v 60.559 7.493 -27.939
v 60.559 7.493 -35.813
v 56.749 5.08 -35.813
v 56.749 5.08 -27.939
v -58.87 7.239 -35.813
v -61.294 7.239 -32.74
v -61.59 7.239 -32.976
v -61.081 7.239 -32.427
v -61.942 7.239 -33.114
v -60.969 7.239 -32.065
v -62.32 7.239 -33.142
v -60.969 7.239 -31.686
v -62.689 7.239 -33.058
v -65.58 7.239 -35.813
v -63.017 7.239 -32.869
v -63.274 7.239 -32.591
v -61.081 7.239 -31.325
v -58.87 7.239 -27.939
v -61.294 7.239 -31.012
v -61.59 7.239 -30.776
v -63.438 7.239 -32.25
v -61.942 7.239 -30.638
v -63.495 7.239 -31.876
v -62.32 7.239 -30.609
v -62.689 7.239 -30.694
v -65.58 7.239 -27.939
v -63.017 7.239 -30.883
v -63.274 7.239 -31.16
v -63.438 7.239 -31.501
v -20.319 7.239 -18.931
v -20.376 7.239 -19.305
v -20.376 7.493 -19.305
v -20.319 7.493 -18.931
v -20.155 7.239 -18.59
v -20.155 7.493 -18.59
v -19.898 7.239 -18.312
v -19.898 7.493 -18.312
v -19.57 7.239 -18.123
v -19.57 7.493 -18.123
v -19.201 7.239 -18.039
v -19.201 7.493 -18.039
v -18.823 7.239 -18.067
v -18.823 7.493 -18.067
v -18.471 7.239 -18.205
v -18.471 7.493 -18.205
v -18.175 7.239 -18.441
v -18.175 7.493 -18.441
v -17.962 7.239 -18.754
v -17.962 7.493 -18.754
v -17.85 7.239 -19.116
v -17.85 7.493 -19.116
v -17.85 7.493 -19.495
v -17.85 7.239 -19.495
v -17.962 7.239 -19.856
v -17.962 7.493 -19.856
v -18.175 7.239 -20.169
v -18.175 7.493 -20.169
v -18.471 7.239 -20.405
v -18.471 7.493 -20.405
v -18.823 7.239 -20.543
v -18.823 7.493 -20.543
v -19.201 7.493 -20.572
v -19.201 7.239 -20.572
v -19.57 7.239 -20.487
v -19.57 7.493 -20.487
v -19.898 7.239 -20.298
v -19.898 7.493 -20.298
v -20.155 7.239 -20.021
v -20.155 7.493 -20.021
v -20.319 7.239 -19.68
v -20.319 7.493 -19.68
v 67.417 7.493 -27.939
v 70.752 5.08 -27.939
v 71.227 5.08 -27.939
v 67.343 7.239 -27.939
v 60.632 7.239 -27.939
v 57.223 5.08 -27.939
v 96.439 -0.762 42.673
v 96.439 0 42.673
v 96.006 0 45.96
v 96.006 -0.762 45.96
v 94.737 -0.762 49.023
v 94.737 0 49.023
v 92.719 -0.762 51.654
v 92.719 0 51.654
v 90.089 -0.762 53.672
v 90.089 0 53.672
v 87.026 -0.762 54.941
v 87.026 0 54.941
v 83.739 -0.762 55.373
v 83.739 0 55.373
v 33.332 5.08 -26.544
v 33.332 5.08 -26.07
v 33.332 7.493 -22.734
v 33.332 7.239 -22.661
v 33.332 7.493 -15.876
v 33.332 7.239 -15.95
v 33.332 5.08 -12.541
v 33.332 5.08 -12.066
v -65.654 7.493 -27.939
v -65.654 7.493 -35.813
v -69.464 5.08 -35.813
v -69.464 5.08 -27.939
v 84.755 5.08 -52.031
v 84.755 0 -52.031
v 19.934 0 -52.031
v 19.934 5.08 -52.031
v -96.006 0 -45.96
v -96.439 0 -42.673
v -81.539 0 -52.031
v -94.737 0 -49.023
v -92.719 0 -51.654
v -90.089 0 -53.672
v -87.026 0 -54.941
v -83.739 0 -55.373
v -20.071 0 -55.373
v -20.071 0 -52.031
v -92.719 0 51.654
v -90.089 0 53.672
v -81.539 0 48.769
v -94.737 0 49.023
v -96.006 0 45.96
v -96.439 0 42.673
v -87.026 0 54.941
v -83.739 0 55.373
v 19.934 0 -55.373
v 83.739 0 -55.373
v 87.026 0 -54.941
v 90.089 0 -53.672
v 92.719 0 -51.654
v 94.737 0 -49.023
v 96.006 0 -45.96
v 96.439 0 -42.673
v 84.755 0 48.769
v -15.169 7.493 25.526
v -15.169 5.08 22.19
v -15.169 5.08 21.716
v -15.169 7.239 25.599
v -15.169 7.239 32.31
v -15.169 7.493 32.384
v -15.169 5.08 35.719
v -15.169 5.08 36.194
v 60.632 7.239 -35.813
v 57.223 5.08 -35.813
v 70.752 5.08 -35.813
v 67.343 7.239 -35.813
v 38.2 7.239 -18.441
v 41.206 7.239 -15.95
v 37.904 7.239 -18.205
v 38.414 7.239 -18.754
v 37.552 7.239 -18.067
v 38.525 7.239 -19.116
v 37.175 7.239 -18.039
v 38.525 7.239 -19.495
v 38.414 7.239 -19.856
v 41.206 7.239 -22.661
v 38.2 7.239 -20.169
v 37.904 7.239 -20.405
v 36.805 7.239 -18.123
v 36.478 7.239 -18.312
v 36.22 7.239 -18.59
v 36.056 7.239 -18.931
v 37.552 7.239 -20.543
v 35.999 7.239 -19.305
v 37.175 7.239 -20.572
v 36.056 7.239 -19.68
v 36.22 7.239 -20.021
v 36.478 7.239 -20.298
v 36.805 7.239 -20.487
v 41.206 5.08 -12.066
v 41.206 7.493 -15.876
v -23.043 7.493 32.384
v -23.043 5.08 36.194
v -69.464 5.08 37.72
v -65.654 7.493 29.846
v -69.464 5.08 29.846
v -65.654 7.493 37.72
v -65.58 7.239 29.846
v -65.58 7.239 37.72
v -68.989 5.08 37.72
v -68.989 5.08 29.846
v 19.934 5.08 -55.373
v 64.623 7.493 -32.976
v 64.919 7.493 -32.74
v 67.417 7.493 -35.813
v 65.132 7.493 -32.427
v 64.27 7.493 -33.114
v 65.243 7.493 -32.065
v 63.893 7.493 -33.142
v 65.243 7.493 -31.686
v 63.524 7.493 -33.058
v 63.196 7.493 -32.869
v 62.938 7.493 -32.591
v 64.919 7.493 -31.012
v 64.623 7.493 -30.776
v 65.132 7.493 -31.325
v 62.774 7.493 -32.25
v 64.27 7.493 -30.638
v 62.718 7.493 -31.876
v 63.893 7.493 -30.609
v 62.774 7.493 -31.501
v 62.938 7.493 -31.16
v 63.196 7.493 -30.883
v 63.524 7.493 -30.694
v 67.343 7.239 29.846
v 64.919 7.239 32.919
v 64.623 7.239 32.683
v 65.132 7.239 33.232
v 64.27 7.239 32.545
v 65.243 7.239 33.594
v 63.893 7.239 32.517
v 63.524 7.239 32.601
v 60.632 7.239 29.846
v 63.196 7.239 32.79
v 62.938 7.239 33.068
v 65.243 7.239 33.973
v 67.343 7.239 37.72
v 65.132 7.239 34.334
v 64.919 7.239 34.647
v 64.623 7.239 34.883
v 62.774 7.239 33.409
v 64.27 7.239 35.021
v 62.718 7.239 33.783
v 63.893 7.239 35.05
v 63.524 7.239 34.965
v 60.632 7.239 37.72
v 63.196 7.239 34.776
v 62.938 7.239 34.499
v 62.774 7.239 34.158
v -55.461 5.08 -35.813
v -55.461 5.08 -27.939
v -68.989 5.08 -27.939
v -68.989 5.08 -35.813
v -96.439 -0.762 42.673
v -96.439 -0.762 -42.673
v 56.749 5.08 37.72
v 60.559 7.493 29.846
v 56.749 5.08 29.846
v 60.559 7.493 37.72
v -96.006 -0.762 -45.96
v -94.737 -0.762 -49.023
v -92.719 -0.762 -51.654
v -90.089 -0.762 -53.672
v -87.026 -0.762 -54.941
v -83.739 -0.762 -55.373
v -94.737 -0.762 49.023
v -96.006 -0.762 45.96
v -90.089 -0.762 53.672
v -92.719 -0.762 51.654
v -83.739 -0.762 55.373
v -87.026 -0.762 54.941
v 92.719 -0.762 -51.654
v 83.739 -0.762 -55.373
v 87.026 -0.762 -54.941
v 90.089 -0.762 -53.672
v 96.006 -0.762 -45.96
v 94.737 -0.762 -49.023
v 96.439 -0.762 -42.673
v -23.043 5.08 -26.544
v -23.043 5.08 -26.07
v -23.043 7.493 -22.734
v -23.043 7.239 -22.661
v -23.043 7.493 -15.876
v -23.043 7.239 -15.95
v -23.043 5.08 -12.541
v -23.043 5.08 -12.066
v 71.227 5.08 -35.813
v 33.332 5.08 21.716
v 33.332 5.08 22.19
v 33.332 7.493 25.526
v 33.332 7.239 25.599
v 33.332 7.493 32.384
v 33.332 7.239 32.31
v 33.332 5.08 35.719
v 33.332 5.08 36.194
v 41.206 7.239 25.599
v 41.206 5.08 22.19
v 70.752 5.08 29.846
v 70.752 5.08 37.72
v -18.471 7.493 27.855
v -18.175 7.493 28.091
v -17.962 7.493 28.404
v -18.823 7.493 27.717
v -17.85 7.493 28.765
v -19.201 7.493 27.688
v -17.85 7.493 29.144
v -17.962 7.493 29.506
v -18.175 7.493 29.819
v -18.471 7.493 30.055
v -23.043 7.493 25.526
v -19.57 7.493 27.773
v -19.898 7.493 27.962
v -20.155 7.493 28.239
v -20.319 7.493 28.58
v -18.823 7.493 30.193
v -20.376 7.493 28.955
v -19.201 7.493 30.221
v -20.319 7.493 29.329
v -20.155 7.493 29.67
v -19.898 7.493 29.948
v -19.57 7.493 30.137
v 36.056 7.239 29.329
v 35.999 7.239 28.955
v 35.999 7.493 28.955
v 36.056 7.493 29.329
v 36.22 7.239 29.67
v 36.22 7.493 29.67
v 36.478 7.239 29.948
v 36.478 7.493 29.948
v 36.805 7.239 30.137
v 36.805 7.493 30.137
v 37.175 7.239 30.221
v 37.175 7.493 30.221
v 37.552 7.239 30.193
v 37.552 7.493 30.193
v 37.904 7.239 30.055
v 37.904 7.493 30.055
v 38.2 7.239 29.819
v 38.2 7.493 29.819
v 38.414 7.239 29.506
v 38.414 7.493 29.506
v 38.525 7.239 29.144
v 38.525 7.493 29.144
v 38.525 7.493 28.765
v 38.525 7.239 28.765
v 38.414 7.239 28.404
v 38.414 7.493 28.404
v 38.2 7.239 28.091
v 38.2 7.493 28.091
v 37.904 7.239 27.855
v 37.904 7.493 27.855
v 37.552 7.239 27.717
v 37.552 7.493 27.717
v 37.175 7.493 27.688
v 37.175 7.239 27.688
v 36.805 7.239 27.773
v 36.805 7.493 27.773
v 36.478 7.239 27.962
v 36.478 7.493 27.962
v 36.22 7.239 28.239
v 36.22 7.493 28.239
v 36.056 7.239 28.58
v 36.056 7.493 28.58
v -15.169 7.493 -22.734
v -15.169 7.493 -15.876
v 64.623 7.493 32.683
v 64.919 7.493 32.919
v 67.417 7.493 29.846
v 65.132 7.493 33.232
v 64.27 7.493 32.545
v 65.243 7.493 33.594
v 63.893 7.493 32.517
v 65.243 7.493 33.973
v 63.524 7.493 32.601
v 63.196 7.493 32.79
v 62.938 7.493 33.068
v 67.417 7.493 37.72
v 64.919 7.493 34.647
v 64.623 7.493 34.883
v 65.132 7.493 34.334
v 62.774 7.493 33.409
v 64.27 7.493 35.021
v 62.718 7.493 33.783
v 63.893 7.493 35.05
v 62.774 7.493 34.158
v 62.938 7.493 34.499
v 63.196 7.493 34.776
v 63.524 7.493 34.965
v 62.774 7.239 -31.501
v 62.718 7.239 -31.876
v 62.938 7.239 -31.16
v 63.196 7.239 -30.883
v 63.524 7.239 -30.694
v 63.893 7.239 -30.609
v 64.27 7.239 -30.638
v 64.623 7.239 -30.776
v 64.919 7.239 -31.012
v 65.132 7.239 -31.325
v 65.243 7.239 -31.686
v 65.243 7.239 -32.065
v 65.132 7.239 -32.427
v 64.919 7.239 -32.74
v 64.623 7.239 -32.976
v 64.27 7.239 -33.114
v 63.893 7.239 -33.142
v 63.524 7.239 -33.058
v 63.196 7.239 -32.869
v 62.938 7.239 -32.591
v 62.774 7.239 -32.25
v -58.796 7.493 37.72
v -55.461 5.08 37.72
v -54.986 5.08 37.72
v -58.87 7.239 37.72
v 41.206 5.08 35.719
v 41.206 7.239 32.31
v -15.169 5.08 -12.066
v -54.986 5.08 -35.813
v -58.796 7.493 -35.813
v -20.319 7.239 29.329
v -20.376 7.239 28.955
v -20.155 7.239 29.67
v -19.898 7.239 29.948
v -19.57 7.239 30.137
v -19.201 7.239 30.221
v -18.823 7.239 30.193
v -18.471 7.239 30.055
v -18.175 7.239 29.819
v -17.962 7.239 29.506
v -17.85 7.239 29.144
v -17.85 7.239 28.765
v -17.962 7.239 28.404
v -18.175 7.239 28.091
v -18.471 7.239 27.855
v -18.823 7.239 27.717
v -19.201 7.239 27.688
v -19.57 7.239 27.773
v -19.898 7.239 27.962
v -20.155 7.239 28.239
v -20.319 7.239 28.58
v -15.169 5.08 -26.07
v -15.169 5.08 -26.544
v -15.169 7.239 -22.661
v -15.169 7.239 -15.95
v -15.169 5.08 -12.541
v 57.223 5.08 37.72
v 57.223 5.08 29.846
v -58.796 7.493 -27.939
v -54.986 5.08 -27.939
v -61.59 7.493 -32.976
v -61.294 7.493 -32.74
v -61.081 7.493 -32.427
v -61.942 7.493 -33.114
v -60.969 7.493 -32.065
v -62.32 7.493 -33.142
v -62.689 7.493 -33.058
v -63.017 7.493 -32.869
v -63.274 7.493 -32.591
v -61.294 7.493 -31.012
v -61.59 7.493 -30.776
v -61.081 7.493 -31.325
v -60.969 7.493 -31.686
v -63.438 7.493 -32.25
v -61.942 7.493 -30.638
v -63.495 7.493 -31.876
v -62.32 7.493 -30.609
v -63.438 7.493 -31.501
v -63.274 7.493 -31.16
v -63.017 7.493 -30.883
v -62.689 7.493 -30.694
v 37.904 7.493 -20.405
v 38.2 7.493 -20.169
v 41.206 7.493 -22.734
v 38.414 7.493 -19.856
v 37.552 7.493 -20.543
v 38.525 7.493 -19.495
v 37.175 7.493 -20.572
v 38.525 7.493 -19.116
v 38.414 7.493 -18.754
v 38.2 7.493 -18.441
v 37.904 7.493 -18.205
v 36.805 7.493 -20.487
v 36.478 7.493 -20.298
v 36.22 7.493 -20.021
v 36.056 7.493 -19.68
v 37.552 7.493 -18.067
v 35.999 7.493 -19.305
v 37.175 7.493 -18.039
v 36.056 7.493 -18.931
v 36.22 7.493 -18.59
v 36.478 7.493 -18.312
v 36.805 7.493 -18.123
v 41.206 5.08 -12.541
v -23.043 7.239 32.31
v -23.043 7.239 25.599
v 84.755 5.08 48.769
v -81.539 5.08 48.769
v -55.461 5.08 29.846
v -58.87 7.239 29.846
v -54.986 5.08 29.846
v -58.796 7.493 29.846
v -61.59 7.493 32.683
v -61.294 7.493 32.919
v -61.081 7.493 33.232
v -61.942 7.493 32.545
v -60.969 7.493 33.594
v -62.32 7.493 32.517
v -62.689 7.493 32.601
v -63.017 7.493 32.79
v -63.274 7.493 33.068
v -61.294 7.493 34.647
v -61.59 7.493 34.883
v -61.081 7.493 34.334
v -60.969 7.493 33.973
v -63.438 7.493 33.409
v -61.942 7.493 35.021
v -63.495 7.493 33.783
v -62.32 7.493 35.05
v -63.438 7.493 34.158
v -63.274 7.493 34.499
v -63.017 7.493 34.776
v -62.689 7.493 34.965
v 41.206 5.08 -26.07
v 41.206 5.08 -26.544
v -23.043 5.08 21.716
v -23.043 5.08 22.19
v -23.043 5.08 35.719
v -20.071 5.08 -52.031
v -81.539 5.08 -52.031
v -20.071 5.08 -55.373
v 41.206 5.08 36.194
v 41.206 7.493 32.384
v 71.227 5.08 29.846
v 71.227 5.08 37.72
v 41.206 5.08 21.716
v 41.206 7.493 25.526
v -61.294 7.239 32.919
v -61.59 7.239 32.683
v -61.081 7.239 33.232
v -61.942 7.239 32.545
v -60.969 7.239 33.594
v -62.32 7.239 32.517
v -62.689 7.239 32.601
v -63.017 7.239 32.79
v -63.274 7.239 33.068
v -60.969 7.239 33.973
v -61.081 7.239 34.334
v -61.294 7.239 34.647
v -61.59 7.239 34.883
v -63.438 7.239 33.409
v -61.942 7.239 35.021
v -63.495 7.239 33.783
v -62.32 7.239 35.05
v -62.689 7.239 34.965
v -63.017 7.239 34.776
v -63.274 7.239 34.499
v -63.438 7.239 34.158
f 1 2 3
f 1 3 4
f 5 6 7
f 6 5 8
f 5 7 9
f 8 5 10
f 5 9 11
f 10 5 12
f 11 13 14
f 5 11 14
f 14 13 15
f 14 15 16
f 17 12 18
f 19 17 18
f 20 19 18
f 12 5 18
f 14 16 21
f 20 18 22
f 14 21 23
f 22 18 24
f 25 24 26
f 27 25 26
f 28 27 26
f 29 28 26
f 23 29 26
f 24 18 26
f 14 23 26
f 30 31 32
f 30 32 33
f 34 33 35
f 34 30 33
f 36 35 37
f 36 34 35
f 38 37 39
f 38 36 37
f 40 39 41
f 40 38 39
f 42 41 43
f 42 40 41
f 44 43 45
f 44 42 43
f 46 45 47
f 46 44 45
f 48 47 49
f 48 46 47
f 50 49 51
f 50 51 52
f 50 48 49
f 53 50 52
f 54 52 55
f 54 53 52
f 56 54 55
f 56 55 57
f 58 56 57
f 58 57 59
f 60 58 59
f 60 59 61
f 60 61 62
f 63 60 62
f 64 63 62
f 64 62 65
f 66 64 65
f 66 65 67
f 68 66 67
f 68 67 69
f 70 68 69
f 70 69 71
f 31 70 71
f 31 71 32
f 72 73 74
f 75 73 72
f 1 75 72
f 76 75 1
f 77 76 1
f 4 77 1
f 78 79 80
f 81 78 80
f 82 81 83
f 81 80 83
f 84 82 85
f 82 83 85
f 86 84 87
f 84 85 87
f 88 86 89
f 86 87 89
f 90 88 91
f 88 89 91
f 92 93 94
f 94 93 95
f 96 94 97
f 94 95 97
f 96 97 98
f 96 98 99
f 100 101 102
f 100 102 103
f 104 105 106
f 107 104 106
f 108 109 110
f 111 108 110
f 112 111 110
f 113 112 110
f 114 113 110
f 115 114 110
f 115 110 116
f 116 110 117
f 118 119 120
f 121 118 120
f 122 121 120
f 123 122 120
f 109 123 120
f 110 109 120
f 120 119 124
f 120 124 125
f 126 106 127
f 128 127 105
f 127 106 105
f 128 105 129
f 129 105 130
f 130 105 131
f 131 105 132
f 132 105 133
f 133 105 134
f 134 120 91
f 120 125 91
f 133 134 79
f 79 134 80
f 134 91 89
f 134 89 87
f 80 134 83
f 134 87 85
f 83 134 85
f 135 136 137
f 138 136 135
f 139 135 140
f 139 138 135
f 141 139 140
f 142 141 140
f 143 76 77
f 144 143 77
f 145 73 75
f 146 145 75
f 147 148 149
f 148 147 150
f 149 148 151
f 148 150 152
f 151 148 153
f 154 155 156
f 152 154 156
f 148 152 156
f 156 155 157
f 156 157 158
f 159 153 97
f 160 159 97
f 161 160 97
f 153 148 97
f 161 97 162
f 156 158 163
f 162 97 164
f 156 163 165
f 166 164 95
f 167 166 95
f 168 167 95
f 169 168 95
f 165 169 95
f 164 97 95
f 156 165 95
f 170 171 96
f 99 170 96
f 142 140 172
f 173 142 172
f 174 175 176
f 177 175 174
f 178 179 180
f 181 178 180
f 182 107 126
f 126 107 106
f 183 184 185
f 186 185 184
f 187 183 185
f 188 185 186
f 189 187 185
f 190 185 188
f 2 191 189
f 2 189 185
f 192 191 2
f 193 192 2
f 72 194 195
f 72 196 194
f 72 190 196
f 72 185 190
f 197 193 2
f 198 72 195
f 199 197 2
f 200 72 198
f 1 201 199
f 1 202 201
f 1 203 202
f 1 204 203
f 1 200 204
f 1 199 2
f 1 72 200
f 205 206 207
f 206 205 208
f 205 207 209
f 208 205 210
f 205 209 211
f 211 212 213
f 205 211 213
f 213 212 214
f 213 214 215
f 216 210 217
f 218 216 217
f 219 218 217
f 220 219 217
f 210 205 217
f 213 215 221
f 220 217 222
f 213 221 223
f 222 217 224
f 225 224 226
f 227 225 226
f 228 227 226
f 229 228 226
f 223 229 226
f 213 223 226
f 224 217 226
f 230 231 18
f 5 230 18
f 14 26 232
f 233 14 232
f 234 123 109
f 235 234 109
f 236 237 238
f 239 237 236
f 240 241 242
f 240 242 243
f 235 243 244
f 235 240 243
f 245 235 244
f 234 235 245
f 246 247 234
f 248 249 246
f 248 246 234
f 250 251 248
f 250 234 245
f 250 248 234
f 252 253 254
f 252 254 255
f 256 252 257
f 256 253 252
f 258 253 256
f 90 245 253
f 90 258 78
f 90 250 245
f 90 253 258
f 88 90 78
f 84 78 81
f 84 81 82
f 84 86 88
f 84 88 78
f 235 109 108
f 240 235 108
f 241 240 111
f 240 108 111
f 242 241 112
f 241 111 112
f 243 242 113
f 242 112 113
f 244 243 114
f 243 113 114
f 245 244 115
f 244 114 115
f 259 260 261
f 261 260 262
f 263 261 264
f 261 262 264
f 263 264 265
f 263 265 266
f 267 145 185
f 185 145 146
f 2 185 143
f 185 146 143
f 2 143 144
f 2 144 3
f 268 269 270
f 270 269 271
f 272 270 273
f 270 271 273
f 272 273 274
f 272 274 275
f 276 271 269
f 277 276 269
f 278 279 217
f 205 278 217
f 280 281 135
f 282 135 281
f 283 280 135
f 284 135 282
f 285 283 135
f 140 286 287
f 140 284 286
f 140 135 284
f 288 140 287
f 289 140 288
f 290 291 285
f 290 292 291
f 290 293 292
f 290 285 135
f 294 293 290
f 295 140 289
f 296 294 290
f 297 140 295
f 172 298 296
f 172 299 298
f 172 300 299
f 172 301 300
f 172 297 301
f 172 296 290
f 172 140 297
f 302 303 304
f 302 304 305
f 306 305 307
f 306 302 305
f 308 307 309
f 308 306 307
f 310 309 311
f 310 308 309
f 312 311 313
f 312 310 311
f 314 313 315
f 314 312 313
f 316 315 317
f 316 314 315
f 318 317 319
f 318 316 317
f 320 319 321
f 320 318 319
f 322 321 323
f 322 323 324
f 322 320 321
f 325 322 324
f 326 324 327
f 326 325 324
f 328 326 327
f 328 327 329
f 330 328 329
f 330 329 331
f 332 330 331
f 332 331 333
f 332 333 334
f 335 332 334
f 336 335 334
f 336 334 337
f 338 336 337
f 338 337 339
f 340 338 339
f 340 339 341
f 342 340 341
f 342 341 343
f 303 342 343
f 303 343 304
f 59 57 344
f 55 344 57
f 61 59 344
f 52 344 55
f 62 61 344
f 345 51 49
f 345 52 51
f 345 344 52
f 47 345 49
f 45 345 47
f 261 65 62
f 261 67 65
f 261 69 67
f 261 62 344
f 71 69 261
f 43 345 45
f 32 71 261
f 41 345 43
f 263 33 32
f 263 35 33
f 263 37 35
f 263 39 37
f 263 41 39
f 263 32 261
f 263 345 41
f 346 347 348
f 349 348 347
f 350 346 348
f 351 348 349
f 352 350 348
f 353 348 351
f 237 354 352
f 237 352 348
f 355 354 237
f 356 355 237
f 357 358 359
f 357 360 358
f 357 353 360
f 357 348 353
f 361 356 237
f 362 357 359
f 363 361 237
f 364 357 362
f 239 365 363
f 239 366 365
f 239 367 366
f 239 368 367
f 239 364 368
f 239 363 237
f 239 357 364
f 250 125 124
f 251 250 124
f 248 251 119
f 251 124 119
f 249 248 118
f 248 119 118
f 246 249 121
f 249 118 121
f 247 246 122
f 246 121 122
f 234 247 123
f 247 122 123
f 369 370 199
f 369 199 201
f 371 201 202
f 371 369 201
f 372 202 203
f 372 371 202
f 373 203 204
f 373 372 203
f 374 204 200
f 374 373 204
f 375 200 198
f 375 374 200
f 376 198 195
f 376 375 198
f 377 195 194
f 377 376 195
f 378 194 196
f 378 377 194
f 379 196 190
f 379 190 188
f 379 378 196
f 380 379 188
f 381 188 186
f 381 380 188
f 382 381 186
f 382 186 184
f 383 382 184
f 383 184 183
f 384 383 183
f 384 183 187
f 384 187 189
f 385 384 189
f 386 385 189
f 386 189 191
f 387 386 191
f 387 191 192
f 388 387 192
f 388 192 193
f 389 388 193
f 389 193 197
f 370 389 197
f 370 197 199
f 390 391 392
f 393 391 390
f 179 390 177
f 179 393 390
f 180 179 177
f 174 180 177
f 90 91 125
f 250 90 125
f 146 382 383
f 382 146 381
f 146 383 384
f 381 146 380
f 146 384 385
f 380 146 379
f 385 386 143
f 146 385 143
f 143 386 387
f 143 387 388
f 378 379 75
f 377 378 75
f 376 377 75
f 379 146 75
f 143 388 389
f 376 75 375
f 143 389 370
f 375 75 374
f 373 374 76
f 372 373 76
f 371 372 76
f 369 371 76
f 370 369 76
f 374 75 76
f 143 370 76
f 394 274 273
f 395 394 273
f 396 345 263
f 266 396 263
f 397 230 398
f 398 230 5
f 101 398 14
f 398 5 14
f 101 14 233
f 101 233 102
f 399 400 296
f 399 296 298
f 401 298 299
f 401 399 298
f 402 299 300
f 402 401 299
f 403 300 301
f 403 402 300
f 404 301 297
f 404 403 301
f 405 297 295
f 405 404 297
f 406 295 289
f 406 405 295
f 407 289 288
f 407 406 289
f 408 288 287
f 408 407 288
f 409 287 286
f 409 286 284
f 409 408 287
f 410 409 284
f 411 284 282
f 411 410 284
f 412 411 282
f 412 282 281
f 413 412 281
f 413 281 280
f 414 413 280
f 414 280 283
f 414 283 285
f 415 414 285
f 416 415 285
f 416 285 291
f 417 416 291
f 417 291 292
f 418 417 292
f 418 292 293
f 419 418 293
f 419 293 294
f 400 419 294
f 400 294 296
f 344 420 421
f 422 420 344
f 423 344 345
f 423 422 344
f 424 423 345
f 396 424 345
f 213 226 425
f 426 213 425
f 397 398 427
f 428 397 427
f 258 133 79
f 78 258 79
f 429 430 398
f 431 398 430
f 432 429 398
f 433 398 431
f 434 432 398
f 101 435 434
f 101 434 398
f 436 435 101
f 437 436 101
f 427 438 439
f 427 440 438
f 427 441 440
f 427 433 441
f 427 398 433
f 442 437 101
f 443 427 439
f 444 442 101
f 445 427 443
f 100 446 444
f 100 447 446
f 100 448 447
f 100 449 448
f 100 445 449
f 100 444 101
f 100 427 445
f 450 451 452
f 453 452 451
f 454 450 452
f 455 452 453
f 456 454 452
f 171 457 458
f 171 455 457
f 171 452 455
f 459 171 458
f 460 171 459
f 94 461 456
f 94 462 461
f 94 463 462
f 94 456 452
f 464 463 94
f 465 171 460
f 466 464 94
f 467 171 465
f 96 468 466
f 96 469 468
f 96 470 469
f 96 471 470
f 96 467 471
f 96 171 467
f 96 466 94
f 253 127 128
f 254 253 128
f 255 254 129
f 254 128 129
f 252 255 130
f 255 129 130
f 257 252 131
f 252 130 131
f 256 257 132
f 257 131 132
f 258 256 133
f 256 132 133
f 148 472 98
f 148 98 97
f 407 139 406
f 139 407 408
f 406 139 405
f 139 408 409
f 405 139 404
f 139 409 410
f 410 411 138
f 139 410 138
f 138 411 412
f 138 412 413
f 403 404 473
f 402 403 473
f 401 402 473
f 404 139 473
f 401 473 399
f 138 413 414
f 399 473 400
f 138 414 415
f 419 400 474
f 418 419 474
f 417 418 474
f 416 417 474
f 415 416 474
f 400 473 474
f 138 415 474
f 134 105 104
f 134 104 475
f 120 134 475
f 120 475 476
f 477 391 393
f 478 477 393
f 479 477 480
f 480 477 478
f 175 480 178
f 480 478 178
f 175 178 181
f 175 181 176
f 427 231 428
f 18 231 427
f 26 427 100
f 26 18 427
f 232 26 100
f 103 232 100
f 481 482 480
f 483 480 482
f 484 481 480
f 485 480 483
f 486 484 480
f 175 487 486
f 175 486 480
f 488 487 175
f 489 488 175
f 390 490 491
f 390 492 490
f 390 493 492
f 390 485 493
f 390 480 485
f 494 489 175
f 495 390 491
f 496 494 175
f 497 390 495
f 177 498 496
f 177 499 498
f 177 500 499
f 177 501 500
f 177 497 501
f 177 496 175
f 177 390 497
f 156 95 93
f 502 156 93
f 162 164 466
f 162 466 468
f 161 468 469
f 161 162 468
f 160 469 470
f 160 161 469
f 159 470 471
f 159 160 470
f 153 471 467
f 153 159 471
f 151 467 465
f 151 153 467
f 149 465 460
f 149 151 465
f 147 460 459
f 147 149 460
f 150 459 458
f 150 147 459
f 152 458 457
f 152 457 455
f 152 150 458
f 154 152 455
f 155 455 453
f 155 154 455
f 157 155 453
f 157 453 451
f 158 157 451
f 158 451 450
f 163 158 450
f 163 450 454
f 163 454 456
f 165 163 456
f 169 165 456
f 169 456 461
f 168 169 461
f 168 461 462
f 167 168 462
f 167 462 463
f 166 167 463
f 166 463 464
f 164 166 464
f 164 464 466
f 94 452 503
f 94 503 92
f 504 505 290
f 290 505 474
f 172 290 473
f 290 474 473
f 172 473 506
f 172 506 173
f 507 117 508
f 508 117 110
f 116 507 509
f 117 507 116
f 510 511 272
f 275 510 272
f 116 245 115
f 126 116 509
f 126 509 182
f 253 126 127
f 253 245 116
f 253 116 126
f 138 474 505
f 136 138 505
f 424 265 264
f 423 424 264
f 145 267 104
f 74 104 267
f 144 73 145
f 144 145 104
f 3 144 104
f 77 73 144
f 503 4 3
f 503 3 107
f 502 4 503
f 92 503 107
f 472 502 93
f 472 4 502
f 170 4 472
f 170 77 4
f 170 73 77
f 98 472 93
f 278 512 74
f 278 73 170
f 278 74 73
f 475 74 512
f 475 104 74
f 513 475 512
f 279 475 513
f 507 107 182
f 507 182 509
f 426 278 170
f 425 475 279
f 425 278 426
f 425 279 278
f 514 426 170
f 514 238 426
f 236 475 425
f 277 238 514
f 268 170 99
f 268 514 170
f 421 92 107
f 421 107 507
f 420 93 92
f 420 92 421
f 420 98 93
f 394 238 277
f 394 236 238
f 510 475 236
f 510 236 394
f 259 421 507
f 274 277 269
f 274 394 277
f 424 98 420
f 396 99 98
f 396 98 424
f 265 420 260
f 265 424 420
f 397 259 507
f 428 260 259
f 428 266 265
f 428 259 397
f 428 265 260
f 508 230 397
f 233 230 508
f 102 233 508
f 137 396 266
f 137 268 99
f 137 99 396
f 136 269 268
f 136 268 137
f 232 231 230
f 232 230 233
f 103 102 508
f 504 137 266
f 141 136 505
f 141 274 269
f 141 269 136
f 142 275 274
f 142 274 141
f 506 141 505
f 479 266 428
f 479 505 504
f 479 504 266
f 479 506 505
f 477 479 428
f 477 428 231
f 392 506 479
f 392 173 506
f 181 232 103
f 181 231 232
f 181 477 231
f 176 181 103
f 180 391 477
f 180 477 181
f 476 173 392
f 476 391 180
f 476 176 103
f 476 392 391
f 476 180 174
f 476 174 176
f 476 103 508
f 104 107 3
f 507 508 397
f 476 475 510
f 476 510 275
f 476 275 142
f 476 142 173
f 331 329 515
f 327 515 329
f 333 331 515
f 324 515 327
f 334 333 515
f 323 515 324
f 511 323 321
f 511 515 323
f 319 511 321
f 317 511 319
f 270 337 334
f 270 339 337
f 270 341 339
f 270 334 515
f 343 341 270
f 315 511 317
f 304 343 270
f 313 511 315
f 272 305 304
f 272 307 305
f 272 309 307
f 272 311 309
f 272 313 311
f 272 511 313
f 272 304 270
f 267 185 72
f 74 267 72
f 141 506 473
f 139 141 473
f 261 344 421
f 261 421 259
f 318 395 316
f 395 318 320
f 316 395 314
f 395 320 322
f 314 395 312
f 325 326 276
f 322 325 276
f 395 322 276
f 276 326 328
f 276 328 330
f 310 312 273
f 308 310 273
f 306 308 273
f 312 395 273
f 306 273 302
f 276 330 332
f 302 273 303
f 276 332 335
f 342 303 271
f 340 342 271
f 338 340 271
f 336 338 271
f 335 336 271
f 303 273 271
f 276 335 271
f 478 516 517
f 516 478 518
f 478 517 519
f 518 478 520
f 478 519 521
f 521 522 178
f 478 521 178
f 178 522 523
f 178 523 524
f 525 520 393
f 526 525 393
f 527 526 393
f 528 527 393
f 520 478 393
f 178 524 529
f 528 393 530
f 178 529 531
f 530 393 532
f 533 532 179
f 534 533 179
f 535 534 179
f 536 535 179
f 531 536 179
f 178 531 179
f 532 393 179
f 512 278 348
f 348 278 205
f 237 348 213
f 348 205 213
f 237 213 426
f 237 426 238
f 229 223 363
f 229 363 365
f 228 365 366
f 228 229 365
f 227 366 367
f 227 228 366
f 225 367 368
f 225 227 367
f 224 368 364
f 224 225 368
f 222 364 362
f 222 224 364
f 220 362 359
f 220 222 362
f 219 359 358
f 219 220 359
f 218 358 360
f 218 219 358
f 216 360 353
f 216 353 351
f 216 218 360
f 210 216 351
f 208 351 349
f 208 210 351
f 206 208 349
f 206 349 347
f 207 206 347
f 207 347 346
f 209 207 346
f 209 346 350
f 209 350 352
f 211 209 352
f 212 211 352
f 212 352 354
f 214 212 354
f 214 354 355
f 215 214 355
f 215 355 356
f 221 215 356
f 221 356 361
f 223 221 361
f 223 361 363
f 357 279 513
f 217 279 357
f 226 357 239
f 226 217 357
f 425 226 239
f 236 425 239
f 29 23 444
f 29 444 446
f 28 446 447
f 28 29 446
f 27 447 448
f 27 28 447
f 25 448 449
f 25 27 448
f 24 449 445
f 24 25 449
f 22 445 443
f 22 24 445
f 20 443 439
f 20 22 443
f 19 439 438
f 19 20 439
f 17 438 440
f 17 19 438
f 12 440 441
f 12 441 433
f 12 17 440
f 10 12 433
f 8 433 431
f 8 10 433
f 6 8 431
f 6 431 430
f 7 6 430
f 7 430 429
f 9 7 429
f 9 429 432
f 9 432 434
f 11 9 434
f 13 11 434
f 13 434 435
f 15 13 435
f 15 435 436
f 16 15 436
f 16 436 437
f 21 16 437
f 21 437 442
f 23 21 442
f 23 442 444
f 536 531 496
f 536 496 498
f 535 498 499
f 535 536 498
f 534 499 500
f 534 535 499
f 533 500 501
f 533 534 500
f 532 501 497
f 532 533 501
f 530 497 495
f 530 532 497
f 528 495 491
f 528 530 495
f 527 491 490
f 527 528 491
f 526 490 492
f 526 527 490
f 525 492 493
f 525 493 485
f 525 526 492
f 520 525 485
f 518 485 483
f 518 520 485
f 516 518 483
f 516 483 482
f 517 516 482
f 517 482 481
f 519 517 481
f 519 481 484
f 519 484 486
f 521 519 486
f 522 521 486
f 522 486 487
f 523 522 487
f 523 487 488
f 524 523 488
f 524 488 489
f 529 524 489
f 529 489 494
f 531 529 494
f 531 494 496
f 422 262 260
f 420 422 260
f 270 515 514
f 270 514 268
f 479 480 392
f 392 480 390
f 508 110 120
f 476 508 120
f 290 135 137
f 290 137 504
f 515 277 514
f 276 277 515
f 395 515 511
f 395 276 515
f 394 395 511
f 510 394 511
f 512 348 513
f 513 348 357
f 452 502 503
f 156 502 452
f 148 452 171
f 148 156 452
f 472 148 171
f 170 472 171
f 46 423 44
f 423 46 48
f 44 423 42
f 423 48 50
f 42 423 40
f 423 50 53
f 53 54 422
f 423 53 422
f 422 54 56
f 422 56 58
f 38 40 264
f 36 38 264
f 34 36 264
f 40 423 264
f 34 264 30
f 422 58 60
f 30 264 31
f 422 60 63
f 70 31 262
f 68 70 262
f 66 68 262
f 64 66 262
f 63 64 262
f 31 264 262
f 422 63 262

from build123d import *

# Parameters (mm, degrees)
F1_DEPTH   = 0.762
F2_W       = 166.2938
F2_H       = 100.7999
F3_DEPTH   = 5.08
F4_W       = 14.478
F4_H       = 7.874
F4_R       = 1.27
F4_W_2     = 7.874
F4_H_2     = 14.478
F5_DEPTH   = 2.413
F6_SIZE2   = 3.80999
F6_SIZE    = 2.41299
F6_2_SIZE2 = 3.80999
F6_2_SIZE  = 2.41299
F6_3_SIZE2 = 3.80999
F6_3_SIZE  = 2.41299
F6_4_SIZE2 = 3.80999
F6_4_SIZE  = 2.41299
F6_5_SIZE2 = 3.80999
F6_5_SIZE  = 2.41299
F6_6_SIZE2 = 3.80999
F6_6_SIZE  = 2.41299
F6_7_SIZE2 = 3.80999
F6_7_SIZE  = 2.41299
F6_8_SIZE2 = 3.80999
F6_8_SIZE  = 2.41299
F6_9_SIZE2 = 3.80999
F6_9_SIZE  = 2.41299
F7_SIZE2   = 3.80999
F7_SIZE    = 2.41299
F7_2_SIZE2 = 3.80999
F7_2_SIZE  = 2.41299
F7_3_SIZE2 = 3.80999
F7_3_SIZE  = 2.41299
F7_4_SIZE2 = 3.80999
F7_4_SIZE  = 2.41299
F7_5_SIZE2 = 3.80999
F7_5_SIZE  = 2.41299
F7_6_SIZE2 = 3.80999
F7_6_SIZE  = 2.41299
F7_7_SIZE2 = 3.80999
F7_7_SIZE  = 2.41299
F9_DEPTH   = 73.533
F11_DEPTH  = 64.2493
F12_W      = 40.005
F12_H      = 5.08
F13_DEPTH  = 3.34264


# Not quite as in the source:
# - a fillet or chamfer is up to 0.001 mm smaller than in the source, because OpenCascade refuses the exact size


with BuildPart() as f1:
    # F0 (on Front) → F1 (new body)
    with BuildSketch(Plane.XZ):
        with BuildLine():
            ThreePointArc((96.43872, 42.67327), (92.7189761211, 51.6535261211), (83.73872, 55.37327))
            Line((83.73872, 55.37327), (-83.73872, 55.37327))
            ThreePointArc((-83.73872, 55.37327), (-92.7189761211, 51.6535261211), (-96.43872, 42.67327))
            Line((-96.43872, 42.67327), (-96.43872, -42.67327))
            ThreePointArc((-96.43872, -42.67327), (-92.7189761211, -51.6535261211), (-83.73872, -55.37327))
            Line((-83.73872, -55.37327), (83.73872, -55.37327))
            ThreePointArc((83.73872, -55.37327), (92.7189761211, -51.6535261211), (96.43872, -42.67327))
            Line((96.43872, -42.67327), (96.43872, 42.67327))
        make_face()
    extrude(amount=F1_DEPTH)

    # F2 (on face) → F3 (join)
    with BuildSketch(Plane(origin=(0, 0, 0), x_dir=(-1, 0, 0), z_dir=(0, 1, 0))):
        with Locations((-1.60782, -1.63068)):
            Rectangle(F2_W, F2_H)
    extrude(amount=F3_DEPTH)

    # F4 (on face) → F5 (join)
    with BuildSketch(Plane(origin=(0, 5.08, 0), x_dir=(-1, 0, 0), z_dir=(0, 1, 0))):
        with Locations((-63.98768, 33.78327)):
            Rectangle(F4_W, F4_H)
        with Locations((-63.98768, 33.78327)):
            Circle(F4_R, mode=Mode.SUBTRACT)
        with Locations((-63.98768, -31.87573)):
            Rectangle(F4_W, F4_H)
        with Locations((-63.98768, -31.87573)):
            Circle(F4_R, mode=Mode.SUBTRACT)
        with Locations((62.22492, 33.78327)):
            Rectangle(F4_W, F4_H)
        with Locations((62.22492, 33.78327)):
            Circle(F4_R, mode=Mode.SUBTRACT)
        with Locations((62.22492, -31.87573)):
            Rectangle(F4_W, F4_H)
        with Locations((62.22492, -31.87573)):
            Circle(F4_R, mode=Mode.SUBTRACT)
        with Locations((-37.26942, 28.95473)):
            Rectangle(F4_W_2, F4_H_2)
        with Locations((-37.26942, 28.95473)):
            Circle(F4_R, mode=Mode.SUBTRACT)
        with Locations((19.10588, 28.95473)):
            Rectangle(F4_W_2, F4_H_2)
        with Locations((19.10588, 28.95473)):
            Circle(F4_R, mode=Mode.SUBTRACT)
        with Locations((-37.26942, -19.30527)):
            Rectangle(F4_W_2, F4_H_2)
        with Locations((-37.26942, -19.30527)):
            Circle(F4_R, mode=Mode.SUBTRACT)
        with Locations((19.10588, -19.30527)):
            Rectangle(F4_W_2, F4_H_2)
        with Locations((19.10588, -19.30527)):
            Circle(F4_R, mode=Mode.SUBTRACT)
    extrude(amount=F5_DEPTH)

    # F6 (size 2.413 and 3.81 in the source; OpenCascade refuses exactly that, so slightly less here)
    f6_edges = [f1.edges().sort_by_distance(p)[0] for p in [
        (56.74868, 7.493, 33.78327),
    ]]
    f6_side = f1.faces().sort_by_distance((56.74868, 6.2865, 33.78327))[0]
    chamfer(f6_edges, length=F6_SIZE, length2=F6_SIZE2, reference=f6_side)

    # F6#2 (size 2.413 and 3.81 in the source; OpenCascade refuses exactly that, so slightly less here)
    f6_2_edges = [f1.edges().sort_by_distance(p)[0] for p in [
        (71.22668, 7.493, 33.78327),
    ]]
    f6_2_side = f1.faces().sort_by_distance((71.22668, 6.2865, 33.78327))[0]
    chamfer(f6_2_edges, length=F6_2_SIZE, length2=F6_2_SIZE2, reference=f6_2_side)

    # F6#3 (size 2.413 and 3.81 in the source; OpenCascade refuses exactly that, so slightly less here)
    f6_3_edges = [f1.edges().sort_by_distance(p)[0] for p in [
        (56.74868, 7.493, -31.87573),
    ]]
    f6_3_side = f1.faces().sort_by_distance((56.74868, 6.2865, -31.87573))[0]
    chamfer(f6_3_edges, length=F6_3_SIZE, length2=F6_3_SIZE2, reference=f6_3_side)

    # F6#4 (size 2.413 and 3.81 in the source; OpenCascade refuses exactly that, so slightly less here)
    f6_4_edges = [f1.edges().sort_by_distance(p)[0] for p in [
        (37.26942, 7.493, -26.54427),
    ]]
    f6_4_side = f1.faces().sort_by_distance((37.26942, 6.2865, -26.54427))[0]
    chamfer(f6_4_edges, length=F6_4_SIZE, length2=F6_4_SIZE2, reference=f6_4_side)

    # F6#5 (size 2.413 and 3.81 in the source; OpenCascade refuses exactly that, so slightly less here)
    f6_5_edges = [f1.edges().sort_by_distance(p)[0] for p in [
        (37.26942, 7.493, 21.71573),
    ]]
    f6_5_side = f1.faces().sort_by_distance((37.26942, 6.2865, 21.71573))[0]
    chamfer(f6_5_edges, length=F6_5_SIZE, length2=F6_5_SIZE2, reference=f6_5_side)

    # F6#6 (size 2.413 and 3.81 in the source; OpenCascade refuses exactly that, so slightly less here)
    f6_6_edges = [f1.edges().sort_by_distance(p)[0] for p in [
        (-19.10588, 7.493, -26.54427),
    ]]
    f6_6_side = f1.faces().sort_by_distance((-19.10588, 6.2865, -26.54427))[0]
    chamfer(f6_6_edges, length=F6_6_SIZE, length2=F6_6_SIZE2, reference=f6_6_side)

    # F6#7 (size 2.413 and 3.81 in the source; OpenCascade refuses exactly that, so slightly less here)
    f6_7_edges = [f1.edges().sort_by_distance(p)[0] for p in [
        (-19.10588, 7.493, 21.71573),
    ]]
    f6_7_side = f1.faces().sort_by_distance((-19.10588, 6.2865, 21.71573))[0]
    chamfer(f6_7_edges, length=F6_7_SIZE, length2=F6_7_SIZE2, reference=f6_7_side)

    # F6#8 (size 2.413 and 3.81 in the source; OpenCascade refuses exactly that, so slightly less here)
    f6_8_edges = [f1.edges().sort_by_distance(p)[0] for p in [
        (-69.46392, 7.493, 33.78327),
    ]]
    f6_8_side = f1.faces().sort_by_distance((-69.46392, 6.2865, 33.78327))[0]
    chamfer(f6_8_edges, length=F6_8_SIZE, length2=F6_8_SIZE2, reference=f6_8_side)

    # F6#9 (size 2.413 and 3.81 in the source; OpenCascade refuses exactly that, so slightly less here)
    f6_9_edges = [f1.edges().sort_by_distance(p)[0] for p in [
        (-69.46392, 7.493, -31.87573),
    ]]
    f6_9_side = f1.faces().sort_by_distance((-69.46392, 6.2865, -31.87573))[0]
    chamfer(f6_9_edges, length=F6_9_SIZE, length2=F6_9_SIZE2, reference=f6_9_side)

    # F7 (size 2.413 and 3.81 in the source; OpenCascade refuses exactly that, so slightly less here)
    f7_edges = [f1.edges().sort_by_distance(p)[0] for p in [
        (37.26942, 7.493, 36.19373),
    ]]
    f7_side = f1.faces().sort_by_distance((37.26942, 6.2865, 36.19373))[0]
    chamfer(f7_edges, length=F7_SIZE, length2=F7_SIZE2, reference=f7_side)

    # F7#2 (size 2.413 and 3.81 in the source; OpenCascade refuses exactly that, so slightly less here)
    f7_2_edges = [f1.edges().sort_by_distance(p)[0] for p in [
        (71.22668, 7.493, -31.87573),
    ]]
    f7_2_side = f1.faces().sort_by_distance((71.22668, 6.2865, -31.87573))[0]
    chamfer(f7_2_edges, length=F7_2_SIZE, length2=F7_2_SIZE2, reference=f7_2_side)

    # F7#3 (size 2.413 and 3.81 in the source; OpenCascade refuses exactly that, so slightly less here)
    f7_3_edges = [f1.edges().sort_by_distance(p)[0] for p in [
        (37.26942, 7.493, -12.06627),
    ]]
    f7_3_side = f1.faces().sort_by_distance((37.26942, 6.2865, -12.06627))[0]
    chamfer(f7_3_edges, length=F7_3_SIZE, length2=F7_3_SIZE2, reference=f7_3_side)

    # F7#4 (size 2.413 and 3.81 in the source; OpenCascade refuses exactly that, so slightly less here)
    f7_4_edges = [f1.edges().sort_by_distance(p)[0] for p in [
        (-19.10588, 7.493, -12.06627),
    ]]
    f7_4_side = f1.faces().sort_by_distance((-19.10588, 6.2865, -12.06627))[0]
    chamfer(f7_4_edges, length=F7_4_SIZE, length2=F7_4_SIZE2, reference=f7_4_side)

    # F7#5 (size 2.413 and 3.81 in the source; OpenCascade refuses exactly that, so slightly less here)
    f7_5_edges = [f1.edges().sort_by_distance(p)[0] for p in [
        (-19.10588, 7.493, 36.19373),
    ]]
    f7_5_side = f1.faces().sort_by_distance((-19.10588, 6.2865, 36.19373))[0]
    chamfer(f7_5_edges, length=F7_5_SIZE, length2=F7_5_SIZE2, reference=f7_5_side)

    # F7#6 (size 2.413 and 3.81 in the source; OpenCascade refuses exactly that, so slightly less here)
    f7_6_edges = [f1.edges().sort_by_distance(p)[0] for p in [
        (-54.98592, 7.493, 33.78327),
    ]]
    f7_6_side = f1.faces().sort_by_distance((-54.98592, 6.2865, 33.78327))[0]
    chamfer(f7_6_edges, length=F7_6_SIZE, length2=F7_6_SIZE2, reference=f7_6_side)

    # F7#7 (size 2.413 and 3.81 in the source; OpenCascade refuses exactly that, so slightly less here)
    f7_7_edges = [f1.edges().sort_by_distance(p)[0] for p in [
        (-54.98592, 7.493, -31.87573),
    ]]
    f7_7_side = f1.faces().sort_by_distance((-54.98592, 6.2865, -31.87573))[0]
    chamfer(f7_7_edges, length=F7_7_SIZE, length2=F7_7_SIZE2, reference=f7_7_side)

    # F8 (on face) → F9 (cut, through all)
    with BuildSketch(Plane.XY.offset(37.72027)):
        Polygon((-65.5802524895, 7.239), (-68.9891998579, 5.08), (-55.4606401421, 5.08), (-58.8695875105, 7.239), align=None)
        Polygon((60.6323475105, 7.239), (57.2234001421, 5.08), (70.7519598579, 5.08), (67.3430124895, 7.239), align=None)
    extrude(amount=-F9_DEPTH, mode=Mode.SUBTRACT)

    # F10 (on face) → F11 (cut, through all)
    with BuildSketch(Plane(origin=(-23.04288, 0, 0), x_dir=(0, -1, 0), z_dir=(-1, 0, 0))):
        Polygon((-7.239, -22.6606024895), (-5.08, -26.0695498579), (-5.08, -12.5409901421), (-7.239, -15.9499375105), align=None)
        Polygon((-7.239, 25.5993975105), (-5.08, 22.1904501421), (-5.08, 35.7190098579), (-7.239, 32.3100624895), align=None)
    extrude(amount=-F11_DEPTH, mode=Mode.SUBTRACT)

    # F12 (on face) → F13 (join, through all)
    with BuildSketch(Plane(origin=(0, 0, -52.03063), x_dir=(1, 0, 0), z_dir=(0, 0, -1))):
        with Locations((-0.06858, -2.54)):
            Rectangle(F12_W, F12_H)
    extrude(amount=F13_DEPTH)


solid = f1.part
